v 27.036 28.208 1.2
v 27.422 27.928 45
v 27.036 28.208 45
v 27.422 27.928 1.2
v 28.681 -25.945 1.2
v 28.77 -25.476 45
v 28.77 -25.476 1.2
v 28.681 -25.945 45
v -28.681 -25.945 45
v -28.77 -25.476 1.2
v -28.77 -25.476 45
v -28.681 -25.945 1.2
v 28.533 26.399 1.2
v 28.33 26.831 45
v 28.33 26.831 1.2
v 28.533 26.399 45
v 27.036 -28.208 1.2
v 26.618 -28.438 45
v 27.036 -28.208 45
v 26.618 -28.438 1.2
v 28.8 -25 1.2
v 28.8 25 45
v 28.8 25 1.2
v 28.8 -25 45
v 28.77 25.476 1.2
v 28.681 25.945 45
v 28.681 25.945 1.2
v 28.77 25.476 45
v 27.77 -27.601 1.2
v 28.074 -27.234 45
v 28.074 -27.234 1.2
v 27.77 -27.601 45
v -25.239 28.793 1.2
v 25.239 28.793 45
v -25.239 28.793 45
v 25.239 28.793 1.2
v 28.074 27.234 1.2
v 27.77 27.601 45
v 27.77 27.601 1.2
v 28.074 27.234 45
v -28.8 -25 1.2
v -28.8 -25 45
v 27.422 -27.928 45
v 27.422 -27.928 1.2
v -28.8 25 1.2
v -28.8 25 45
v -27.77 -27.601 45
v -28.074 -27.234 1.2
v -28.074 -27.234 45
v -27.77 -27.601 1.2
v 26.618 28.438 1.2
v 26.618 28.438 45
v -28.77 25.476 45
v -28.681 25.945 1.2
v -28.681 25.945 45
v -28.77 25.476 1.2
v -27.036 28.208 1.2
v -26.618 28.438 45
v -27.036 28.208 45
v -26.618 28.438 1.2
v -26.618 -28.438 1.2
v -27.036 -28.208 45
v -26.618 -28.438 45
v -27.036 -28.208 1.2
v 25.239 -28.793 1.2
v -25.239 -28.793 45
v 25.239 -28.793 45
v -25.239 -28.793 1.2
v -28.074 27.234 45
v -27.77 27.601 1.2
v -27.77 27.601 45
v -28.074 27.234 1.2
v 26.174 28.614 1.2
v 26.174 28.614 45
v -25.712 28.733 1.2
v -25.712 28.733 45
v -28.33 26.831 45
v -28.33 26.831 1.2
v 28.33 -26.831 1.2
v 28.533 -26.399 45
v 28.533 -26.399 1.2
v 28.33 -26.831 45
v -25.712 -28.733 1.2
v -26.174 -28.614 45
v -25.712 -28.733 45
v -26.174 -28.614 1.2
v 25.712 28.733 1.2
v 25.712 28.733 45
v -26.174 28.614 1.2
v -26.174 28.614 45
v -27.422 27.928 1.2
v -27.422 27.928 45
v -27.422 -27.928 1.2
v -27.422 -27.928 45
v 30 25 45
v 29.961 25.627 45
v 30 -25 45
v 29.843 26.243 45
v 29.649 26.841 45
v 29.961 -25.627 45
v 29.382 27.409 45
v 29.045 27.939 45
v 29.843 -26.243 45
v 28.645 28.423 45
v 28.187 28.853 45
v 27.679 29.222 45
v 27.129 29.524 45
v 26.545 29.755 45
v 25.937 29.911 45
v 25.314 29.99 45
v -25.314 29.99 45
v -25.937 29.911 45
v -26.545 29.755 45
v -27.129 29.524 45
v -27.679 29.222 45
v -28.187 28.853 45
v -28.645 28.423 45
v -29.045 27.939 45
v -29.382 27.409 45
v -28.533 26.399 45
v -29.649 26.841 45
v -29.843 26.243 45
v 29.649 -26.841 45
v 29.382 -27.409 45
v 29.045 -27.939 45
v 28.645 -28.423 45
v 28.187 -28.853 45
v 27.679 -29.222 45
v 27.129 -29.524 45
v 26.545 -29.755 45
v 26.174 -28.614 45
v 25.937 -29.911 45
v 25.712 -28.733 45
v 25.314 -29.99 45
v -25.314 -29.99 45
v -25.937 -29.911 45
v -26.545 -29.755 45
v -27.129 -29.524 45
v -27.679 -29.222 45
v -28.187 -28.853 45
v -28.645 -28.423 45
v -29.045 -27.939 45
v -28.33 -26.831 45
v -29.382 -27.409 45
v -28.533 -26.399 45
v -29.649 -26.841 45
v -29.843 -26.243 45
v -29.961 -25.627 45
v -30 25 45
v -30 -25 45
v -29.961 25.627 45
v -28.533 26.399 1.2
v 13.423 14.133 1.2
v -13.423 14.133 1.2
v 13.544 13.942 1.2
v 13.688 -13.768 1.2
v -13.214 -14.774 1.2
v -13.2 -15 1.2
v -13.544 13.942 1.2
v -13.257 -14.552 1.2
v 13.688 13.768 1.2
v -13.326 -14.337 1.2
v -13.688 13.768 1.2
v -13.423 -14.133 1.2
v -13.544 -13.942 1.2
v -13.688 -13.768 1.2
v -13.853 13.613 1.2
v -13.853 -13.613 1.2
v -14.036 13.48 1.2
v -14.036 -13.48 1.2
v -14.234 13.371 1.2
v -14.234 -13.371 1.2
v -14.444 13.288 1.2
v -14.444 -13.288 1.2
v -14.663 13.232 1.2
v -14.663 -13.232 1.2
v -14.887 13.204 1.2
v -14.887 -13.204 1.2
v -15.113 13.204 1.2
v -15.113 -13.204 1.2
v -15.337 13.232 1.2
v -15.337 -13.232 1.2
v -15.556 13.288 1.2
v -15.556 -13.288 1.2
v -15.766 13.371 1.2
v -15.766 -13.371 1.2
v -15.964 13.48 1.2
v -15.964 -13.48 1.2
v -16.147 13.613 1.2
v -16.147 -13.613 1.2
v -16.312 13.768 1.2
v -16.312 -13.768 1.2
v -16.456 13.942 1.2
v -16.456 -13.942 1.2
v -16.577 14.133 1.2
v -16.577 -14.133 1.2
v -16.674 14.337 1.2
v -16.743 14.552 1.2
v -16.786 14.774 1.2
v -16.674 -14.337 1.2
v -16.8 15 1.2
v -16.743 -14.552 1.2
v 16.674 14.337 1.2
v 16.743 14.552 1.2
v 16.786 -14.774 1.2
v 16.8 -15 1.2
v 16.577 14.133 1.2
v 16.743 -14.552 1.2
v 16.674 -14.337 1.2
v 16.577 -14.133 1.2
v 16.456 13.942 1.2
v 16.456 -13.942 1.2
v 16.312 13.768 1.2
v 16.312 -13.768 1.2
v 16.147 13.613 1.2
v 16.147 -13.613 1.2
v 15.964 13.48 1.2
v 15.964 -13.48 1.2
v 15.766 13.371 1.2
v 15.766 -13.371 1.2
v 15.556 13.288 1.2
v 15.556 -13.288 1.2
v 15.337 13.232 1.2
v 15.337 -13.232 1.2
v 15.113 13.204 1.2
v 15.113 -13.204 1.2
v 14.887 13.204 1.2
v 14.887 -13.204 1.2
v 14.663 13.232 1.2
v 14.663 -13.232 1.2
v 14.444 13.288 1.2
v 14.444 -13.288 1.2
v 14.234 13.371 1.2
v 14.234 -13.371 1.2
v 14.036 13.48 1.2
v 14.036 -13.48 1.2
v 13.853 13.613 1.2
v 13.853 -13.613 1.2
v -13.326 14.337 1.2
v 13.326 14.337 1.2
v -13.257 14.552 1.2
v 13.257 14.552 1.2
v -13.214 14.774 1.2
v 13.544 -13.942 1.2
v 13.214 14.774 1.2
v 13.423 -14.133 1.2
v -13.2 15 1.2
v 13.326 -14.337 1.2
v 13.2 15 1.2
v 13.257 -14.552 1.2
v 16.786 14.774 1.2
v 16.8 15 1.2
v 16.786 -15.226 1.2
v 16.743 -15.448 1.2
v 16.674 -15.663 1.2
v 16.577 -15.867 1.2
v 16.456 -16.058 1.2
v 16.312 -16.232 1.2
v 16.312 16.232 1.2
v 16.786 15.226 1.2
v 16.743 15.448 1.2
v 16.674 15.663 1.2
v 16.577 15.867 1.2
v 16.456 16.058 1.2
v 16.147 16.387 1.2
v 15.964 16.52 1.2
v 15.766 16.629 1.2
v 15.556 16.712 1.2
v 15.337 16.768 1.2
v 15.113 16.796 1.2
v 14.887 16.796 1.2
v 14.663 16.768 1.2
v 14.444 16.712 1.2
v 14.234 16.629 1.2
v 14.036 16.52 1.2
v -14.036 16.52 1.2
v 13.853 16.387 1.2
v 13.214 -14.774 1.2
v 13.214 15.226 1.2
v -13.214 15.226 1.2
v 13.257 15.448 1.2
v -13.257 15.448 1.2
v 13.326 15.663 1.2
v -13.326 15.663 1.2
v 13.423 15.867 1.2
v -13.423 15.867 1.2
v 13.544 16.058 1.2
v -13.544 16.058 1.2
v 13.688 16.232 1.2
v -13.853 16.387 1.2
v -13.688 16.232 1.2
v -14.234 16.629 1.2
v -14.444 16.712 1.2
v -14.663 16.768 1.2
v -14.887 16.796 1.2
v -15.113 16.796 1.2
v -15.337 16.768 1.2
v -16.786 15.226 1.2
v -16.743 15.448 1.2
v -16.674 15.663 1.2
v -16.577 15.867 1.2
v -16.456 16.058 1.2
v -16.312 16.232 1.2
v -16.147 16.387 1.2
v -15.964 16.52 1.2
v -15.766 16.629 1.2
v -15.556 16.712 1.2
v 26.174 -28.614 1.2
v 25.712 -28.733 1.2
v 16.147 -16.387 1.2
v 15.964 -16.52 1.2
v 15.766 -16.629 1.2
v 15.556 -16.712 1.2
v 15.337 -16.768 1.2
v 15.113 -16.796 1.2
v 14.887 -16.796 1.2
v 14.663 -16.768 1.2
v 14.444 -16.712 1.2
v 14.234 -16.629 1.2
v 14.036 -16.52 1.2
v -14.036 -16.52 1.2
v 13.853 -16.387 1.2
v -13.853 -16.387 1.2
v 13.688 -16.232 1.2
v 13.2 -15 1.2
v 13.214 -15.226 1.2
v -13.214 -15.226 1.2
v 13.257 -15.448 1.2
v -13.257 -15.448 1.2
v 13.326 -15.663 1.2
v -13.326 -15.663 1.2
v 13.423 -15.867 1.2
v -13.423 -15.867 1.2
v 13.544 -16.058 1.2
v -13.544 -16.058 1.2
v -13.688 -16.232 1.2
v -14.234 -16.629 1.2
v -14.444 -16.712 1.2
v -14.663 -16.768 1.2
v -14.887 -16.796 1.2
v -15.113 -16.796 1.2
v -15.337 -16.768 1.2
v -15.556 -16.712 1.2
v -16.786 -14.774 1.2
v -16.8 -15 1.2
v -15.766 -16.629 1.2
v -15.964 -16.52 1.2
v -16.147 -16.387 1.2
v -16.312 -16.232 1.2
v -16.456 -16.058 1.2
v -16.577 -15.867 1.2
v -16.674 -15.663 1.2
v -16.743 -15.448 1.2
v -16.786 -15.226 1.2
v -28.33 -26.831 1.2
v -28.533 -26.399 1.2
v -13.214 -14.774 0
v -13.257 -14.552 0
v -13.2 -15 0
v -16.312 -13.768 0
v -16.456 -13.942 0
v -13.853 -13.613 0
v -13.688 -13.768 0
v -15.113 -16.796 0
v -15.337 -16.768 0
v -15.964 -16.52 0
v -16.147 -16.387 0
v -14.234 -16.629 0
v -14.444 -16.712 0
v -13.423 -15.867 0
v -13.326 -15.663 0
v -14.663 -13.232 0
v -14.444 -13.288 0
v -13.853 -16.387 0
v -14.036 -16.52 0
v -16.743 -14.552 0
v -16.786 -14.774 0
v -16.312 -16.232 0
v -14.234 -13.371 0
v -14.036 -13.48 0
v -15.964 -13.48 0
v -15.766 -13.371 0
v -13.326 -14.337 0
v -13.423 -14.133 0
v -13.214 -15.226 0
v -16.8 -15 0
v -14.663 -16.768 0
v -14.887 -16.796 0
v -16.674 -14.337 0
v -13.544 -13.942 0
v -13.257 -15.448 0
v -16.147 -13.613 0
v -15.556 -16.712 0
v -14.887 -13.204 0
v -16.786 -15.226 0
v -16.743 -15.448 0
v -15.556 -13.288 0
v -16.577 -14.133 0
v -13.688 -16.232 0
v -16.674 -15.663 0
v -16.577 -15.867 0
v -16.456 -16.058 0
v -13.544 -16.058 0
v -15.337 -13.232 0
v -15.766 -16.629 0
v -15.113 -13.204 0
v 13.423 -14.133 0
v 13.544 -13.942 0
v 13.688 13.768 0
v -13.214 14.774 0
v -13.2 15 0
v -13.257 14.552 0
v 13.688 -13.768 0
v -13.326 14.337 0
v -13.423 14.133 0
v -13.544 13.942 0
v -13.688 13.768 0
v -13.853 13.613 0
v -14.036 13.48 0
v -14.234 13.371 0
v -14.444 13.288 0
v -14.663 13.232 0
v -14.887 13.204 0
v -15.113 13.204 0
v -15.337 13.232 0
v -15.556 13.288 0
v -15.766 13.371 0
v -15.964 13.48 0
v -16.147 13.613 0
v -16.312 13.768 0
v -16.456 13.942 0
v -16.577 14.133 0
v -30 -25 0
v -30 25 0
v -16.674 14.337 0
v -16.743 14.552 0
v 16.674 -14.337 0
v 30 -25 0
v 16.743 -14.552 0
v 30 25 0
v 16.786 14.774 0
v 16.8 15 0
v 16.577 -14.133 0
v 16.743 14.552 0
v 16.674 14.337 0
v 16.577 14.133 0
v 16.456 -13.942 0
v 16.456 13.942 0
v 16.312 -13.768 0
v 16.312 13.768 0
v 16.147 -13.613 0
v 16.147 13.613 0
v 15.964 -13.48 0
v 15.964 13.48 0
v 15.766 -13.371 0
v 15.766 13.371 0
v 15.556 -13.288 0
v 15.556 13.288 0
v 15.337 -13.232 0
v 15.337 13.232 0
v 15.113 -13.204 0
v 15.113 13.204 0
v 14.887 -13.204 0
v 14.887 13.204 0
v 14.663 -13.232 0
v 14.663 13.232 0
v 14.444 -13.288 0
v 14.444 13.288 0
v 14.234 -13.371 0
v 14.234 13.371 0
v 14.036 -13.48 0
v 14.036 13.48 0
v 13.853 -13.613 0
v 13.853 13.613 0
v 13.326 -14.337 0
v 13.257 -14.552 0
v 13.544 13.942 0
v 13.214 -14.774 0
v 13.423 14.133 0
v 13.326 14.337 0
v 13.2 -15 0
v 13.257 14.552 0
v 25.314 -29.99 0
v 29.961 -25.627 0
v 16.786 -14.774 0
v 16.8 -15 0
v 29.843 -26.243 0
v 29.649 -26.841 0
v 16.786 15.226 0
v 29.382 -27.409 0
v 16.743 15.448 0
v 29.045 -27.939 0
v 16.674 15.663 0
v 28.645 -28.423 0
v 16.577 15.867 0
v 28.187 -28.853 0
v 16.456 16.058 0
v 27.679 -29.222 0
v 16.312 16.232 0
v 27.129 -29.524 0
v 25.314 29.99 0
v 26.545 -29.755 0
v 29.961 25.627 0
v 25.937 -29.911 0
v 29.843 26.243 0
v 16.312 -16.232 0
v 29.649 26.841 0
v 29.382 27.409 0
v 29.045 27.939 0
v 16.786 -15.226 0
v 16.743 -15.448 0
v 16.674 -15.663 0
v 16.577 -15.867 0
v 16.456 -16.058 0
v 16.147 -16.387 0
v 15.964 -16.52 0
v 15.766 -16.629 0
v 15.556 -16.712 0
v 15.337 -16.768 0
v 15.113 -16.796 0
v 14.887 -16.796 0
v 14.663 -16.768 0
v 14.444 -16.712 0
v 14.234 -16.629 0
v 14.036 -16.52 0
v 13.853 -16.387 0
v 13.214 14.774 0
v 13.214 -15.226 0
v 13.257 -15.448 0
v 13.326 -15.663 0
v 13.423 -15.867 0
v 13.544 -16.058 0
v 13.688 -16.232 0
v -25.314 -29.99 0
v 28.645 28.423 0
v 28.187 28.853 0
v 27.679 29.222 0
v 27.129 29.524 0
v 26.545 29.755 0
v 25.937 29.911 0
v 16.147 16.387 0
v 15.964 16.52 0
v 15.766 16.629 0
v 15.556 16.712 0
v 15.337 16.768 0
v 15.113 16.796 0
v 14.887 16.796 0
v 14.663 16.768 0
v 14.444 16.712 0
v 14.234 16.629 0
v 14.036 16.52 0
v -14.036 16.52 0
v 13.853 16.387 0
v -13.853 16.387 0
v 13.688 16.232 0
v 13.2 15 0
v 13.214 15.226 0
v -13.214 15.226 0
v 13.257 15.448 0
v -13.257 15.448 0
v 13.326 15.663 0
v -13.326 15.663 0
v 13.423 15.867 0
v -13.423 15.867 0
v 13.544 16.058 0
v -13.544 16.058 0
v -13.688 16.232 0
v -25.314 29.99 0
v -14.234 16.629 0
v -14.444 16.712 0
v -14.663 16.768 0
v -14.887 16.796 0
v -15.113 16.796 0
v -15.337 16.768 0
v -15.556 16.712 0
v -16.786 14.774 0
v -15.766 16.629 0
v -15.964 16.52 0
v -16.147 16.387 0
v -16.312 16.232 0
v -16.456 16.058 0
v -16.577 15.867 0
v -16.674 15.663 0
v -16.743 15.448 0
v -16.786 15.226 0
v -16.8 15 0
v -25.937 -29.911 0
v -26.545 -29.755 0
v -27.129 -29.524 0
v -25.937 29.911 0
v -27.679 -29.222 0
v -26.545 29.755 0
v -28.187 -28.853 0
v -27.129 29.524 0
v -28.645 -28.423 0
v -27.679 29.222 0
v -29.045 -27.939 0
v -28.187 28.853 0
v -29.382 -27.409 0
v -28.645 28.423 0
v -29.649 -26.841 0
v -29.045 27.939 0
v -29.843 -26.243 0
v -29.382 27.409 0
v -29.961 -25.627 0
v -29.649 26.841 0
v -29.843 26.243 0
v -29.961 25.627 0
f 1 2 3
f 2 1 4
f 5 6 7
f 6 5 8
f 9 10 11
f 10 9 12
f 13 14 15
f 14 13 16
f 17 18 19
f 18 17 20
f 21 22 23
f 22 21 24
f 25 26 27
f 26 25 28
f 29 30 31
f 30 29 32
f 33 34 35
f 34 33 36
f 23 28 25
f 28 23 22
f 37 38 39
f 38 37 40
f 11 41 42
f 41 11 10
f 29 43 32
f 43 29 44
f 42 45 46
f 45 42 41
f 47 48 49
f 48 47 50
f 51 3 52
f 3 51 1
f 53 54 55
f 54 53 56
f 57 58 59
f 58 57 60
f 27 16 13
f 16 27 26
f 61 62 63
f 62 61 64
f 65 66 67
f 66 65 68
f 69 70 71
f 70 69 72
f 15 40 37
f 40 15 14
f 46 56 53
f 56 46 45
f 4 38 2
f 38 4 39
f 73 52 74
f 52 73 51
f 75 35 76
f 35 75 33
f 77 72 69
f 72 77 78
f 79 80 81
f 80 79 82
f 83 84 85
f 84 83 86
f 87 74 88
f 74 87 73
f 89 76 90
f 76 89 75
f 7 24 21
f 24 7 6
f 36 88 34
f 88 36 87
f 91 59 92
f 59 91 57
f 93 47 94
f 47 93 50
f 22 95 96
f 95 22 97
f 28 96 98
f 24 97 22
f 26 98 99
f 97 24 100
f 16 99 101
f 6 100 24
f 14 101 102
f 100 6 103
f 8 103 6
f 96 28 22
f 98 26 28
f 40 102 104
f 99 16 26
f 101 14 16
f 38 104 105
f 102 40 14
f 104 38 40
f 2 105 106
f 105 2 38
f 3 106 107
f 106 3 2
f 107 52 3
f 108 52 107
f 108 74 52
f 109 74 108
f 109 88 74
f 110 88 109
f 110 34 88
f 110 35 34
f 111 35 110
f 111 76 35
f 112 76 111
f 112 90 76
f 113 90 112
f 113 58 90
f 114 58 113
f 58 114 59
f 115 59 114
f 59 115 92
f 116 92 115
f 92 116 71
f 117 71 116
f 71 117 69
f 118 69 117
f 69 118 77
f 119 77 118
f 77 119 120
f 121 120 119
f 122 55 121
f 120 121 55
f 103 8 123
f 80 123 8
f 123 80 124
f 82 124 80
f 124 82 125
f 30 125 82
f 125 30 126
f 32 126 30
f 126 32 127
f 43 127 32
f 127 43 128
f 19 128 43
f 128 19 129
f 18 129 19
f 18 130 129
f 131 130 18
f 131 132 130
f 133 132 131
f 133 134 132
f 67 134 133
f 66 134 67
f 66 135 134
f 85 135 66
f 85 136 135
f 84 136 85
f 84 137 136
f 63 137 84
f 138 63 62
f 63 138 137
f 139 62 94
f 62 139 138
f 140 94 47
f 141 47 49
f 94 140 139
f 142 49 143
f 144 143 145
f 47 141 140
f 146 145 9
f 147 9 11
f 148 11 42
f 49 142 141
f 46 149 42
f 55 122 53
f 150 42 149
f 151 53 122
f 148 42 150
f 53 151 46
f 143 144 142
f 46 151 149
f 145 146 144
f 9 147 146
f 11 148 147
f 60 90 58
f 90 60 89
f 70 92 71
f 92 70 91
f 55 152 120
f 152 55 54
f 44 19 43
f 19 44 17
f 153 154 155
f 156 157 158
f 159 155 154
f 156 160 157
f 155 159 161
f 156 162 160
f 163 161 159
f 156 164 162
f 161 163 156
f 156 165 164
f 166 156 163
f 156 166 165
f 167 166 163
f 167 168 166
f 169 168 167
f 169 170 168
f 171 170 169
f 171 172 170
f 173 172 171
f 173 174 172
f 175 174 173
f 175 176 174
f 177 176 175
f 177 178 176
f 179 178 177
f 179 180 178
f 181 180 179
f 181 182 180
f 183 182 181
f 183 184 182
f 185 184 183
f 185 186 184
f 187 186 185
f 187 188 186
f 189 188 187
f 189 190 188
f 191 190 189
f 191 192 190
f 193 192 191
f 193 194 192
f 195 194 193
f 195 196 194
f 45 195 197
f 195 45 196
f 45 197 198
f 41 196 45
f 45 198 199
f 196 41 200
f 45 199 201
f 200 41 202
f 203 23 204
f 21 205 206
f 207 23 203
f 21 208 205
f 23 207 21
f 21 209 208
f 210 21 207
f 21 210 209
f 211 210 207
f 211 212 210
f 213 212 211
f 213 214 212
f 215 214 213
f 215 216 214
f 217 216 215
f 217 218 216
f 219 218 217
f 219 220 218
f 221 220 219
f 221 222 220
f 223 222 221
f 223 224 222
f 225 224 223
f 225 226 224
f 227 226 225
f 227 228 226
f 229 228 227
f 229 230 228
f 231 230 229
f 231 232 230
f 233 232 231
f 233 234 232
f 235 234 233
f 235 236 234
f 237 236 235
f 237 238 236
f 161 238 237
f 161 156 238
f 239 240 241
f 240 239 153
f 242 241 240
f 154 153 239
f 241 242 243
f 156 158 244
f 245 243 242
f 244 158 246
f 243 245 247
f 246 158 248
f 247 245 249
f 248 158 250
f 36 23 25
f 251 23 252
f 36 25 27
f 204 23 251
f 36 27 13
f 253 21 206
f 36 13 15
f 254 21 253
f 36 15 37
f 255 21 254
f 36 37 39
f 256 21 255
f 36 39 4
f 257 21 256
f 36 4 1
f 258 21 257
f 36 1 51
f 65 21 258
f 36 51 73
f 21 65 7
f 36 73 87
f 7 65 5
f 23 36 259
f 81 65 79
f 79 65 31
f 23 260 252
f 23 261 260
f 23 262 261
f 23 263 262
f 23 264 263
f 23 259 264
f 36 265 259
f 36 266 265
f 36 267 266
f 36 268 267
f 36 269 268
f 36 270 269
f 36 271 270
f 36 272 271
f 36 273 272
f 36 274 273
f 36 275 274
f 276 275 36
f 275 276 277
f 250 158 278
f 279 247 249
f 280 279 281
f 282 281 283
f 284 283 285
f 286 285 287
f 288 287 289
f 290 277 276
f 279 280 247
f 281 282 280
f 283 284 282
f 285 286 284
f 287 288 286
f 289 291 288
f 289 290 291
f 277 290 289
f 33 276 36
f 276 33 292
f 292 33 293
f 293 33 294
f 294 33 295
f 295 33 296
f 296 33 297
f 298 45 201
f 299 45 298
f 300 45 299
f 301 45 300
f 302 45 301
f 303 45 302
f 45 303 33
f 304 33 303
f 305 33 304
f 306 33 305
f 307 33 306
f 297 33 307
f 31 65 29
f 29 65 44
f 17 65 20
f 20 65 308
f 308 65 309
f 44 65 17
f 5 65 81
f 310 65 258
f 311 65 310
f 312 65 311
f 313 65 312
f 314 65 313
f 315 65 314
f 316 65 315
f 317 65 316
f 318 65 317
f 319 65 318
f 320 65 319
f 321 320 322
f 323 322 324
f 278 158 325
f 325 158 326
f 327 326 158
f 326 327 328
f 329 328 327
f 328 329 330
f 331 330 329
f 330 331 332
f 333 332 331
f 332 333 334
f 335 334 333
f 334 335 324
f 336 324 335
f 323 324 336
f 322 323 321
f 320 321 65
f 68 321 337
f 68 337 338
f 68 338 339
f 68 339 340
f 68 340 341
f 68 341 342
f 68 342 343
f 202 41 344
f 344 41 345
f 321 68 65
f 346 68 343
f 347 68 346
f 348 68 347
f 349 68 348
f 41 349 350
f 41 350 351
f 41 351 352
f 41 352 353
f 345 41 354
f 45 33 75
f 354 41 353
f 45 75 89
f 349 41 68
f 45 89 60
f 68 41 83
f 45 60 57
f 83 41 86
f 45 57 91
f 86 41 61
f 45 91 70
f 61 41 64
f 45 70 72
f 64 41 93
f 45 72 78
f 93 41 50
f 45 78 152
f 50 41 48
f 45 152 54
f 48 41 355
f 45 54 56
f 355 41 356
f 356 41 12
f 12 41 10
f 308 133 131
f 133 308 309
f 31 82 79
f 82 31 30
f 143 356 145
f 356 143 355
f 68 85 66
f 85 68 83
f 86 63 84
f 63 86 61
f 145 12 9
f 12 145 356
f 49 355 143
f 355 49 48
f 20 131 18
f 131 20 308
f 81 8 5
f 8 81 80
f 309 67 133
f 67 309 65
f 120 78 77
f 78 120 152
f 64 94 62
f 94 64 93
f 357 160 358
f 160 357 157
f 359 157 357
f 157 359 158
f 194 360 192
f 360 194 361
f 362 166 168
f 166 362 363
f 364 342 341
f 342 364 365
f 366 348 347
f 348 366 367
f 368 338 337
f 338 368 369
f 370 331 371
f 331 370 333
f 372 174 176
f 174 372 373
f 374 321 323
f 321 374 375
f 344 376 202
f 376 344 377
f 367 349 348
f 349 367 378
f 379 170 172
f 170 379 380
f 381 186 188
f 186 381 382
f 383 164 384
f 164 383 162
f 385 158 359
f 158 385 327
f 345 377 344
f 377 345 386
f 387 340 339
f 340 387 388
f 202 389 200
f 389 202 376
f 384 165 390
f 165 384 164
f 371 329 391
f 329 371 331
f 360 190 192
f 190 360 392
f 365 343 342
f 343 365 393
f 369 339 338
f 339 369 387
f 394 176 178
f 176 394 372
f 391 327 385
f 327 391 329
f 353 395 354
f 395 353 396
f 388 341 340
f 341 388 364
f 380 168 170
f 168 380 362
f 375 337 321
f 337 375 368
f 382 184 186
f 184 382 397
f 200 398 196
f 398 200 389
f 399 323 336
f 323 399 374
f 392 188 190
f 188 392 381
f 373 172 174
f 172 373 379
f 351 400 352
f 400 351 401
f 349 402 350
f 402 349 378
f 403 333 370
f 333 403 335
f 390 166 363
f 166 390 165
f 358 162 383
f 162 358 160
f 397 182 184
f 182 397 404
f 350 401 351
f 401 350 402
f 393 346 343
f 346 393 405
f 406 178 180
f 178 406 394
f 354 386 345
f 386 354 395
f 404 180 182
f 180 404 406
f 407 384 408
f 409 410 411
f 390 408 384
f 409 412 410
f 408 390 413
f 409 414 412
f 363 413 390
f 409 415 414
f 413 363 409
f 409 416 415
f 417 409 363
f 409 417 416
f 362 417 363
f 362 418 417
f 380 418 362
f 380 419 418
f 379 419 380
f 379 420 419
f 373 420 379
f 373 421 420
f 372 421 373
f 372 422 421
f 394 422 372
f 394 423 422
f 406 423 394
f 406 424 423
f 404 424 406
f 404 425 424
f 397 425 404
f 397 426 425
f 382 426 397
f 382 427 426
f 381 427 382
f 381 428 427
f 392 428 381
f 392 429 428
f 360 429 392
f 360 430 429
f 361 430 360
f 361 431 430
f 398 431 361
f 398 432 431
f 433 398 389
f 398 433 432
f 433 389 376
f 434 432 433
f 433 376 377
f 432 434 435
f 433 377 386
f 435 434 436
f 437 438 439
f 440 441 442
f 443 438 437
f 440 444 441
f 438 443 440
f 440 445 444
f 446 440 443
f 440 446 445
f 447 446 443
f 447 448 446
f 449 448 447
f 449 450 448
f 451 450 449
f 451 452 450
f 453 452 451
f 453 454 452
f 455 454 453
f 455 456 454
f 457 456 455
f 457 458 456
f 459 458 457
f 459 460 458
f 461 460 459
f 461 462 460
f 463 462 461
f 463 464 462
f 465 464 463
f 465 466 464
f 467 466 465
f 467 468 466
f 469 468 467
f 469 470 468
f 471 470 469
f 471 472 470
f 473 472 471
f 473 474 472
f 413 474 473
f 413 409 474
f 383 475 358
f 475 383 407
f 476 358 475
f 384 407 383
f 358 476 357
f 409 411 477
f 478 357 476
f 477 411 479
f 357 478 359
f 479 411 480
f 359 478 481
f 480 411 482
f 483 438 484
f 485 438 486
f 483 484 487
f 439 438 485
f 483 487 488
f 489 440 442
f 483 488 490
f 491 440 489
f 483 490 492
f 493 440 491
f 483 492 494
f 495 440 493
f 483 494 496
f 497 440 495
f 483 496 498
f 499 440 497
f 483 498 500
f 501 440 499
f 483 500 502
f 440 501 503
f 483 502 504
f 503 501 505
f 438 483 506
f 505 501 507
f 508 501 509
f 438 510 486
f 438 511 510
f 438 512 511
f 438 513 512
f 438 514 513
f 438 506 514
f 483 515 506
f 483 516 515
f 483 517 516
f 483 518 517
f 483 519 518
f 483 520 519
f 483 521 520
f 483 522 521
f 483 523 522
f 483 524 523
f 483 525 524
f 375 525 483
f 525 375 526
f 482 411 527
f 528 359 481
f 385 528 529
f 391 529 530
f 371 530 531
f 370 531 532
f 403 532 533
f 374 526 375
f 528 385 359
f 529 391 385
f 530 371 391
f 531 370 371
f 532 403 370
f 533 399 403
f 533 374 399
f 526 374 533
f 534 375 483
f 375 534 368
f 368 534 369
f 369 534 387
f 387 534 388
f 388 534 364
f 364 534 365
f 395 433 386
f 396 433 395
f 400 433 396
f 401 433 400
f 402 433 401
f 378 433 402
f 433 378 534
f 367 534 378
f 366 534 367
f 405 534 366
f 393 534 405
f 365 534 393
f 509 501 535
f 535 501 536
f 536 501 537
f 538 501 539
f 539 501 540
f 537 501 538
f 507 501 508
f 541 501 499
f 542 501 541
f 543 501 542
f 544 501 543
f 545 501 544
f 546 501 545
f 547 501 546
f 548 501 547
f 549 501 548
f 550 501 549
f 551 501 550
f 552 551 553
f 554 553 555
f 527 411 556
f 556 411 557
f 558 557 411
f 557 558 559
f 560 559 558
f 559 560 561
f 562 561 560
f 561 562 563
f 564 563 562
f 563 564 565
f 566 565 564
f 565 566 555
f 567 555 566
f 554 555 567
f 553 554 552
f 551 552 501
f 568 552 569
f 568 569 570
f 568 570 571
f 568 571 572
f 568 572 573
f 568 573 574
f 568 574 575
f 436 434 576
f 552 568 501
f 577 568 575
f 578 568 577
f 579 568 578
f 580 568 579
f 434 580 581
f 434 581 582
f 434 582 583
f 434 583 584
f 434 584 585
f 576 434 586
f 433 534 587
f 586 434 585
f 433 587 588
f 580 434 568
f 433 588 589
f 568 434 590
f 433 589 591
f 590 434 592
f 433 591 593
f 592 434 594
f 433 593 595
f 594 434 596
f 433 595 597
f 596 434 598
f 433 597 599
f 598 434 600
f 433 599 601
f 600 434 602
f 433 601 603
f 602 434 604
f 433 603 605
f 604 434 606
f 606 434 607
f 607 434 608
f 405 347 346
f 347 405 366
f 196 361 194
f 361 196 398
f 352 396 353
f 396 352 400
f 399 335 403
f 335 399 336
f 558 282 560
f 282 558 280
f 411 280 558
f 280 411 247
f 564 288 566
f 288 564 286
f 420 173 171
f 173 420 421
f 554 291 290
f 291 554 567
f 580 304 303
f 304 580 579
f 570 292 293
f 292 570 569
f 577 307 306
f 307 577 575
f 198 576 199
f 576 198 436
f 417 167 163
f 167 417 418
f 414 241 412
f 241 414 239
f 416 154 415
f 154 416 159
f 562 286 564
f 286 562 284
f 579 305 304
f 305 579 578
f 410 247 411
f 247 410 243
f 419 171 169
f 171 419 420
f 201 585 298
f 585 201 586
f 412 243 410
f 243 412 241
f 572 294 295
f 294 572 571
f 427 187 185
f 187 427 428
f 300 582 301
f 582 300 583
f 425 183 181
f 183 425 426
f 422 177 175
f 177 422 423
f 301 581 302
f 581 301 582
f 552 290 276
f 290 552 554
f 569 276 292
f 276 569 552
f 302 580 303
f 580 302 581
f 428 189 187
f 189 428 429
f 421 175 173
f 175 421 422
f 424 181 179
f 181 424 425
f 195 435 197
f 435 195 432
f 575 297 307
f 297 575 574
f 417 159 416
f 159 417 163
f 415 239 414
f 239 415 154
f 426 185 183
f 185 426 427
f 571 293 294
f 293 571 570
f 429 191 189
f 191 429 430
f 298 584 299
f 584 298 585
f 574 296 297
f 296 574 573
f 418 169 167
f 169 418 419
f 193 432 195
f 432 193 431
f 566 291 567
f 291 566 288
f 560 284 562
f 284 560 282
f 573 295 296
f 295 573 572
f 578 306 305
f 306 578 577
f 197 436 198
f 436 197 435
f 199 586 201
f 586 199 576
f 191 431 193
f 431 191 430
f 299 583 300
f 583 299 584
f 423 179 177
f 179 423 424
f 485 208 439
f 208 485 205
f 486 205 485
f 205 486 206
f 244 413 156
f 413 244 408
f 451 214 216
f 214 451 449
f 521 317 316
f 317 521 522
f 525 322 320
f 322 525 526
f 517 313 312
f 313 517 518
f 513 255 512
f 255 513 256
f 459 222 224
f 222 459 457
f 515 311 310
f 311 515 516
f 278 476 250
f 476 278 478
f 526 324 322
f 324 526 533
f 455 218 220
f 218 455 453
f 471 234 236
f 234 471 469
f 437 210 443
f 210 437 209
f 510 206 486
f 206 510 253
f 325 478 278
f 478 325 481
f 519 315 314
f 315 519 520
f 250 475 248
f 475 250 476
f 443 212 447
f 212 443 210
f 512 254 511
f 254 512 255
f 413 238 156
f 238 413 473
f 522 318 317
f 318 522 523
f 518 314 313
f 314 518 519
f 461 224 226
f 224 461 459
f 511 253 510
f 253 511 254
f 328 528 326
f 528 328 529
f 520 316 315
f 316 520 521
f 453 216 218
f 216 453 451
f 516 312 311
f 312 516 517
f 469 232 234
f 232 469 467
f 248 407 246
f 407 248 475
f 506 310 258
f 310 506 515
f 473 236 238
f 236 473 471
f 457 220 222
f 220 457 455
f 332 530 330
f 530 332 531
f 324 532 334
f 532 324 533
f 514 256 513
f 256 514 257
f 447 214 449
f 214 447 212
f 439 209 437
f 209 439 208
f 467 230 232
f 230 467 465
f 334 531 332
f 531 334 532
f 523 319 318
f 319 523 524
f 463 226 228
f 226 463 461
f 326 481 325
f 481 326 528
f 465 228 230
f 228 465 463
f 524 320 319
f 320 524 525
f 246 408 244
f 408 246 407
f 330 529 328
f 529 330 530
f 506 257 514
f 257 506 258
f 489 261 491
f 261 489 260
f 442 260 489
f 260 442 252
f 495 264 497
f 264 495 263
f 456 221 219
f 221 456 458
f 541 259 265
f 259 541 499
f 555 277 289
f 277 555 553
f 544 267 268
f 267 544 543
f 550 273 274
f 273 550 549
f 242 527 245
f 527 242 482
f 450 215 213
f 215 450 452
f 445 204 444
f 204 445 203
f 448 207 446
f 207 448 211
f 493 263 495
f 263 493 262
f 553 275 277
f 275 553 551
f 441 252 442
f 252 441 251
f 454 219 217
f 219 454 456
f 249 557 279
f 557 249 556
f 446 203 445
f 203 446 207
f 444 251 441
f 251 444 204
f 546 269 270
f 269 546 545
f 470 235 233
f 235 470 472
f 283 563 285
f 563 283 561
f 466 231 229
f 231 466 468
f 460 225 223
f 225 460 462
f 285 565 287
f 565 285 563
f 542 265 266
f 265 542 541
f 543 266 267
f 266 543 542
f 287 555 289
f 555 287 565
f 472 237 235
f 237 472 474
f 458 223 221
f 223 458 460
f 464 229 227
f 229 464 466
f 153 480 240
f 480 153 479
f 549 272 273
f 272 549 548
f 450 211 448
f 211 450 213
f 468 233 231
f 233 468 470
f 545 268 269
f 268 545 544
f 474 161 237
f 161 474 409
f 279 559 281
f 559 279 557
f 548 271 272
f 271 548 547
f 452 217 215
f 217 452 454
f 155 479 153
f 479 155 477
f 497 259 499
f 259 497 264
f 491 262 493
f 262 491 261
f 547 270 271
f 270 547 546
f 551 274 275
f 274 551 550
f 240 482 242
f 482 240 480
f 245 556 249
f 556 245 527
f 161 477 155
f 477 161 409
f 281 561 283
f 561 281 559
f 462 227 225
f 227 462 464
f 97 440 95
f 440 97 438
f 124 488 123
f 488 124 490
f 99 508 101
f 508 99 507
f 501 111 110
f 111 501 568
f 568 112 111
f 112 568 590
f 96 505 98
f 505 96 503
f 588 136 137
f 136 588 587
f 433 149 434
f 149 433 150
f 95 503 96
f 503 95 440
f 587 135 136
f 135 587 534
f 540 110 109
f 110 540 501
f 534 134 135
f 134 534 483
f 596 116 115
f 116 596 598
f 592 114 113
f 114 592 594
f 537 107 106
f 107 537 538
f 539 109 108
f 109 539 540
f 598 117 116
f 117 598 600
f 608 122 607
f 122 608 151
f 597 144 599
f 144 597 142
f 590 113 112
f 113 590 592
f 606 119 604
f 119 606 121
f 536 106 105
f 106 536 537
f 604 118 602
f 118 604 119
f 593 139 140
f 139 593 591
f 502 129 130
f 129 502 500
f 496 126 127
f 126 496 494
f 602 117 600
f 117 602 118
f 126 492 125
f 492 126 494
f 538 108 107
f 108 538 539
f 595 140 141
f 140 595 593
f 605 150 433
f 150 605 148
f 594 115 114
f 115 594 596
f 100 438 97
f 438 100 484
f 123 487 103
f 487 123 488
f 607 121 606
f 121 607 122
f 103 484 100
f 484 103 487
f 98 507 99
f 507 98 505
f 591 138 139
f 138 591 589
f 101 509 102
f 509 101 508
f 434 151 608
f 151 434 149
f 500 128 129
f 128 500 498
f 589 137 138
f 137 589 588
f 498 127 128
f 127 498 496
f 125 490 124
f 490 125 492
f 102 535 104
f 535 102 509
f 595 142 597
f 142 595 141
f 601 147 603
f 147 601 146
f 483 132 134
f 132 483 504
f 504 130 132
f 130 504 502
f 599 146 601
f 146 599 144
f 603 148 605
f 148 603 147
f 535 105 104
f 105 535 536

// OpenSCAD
$fn = 50;


difference() {
	union() {
		hull() {
			translate(v = [-25.0000000000, 25.0000000000, 0]) {
				cylinder(h = 45, r = 5);
			}
			translate(v = [25.0000000000, 25.0000000000, 0]) {
				cylinder(h = 45, r = 5);
			}
			translate(v = [-25.0000000000, -25.0000000000, 0]) {
				cylinder(h = 45, r = 5);
			}
			translate(v = [25.0000000000, -25.0000000000, 0]) {
				cylinder(h = 45, r = 5);
			}
		}
	}
	union() {
		translate(v = [0, 0, 1.2000000000]) {
			hull() {
				translate(v = [-25.0000000000, 25.0000000000, 0]) {
					cylinder(h = 43.8000000000, r = 3.8000000000);
				}
				translate(v = [25.0000000000, 25.0000000000, 0]) {
					cylinder(h = 43.8000000000, r = 3.8000000000);
				}
				translate(v = [-25.0000000000, -25.0000000000, 0]) {
					cylinder(h = 43.8000000000, r = 3.8000000000);
				}
				translate(v = [25.0000000000, -25.0000000000, 0]) {
					cylinder(h = 43.8000000000, r = 3.8000000000);
				}
			}
		}
		#translate(v = [-15.0000000000, -15.0000000000, 0]) {
			cylinder(h = 1.2000000000, r = 1.8000000000);
		}
		#translate(v = [-15.0000000000, 15.0000000000, 0]) {
			cylinder(h = 1.2000000000, r = 1.8000000000);
		}
		#translate(v = [15.0000000000, -15.0000000000, 0]) {
			cylinder(h = 1.2000000000, r = 1.8000000000);
		}
		#translate(v = [15.0000000000, 15.0000000000, 0]) {
			cylinder(h = 1.2000000000, r = 1.8000000000);
		}
	}
}
